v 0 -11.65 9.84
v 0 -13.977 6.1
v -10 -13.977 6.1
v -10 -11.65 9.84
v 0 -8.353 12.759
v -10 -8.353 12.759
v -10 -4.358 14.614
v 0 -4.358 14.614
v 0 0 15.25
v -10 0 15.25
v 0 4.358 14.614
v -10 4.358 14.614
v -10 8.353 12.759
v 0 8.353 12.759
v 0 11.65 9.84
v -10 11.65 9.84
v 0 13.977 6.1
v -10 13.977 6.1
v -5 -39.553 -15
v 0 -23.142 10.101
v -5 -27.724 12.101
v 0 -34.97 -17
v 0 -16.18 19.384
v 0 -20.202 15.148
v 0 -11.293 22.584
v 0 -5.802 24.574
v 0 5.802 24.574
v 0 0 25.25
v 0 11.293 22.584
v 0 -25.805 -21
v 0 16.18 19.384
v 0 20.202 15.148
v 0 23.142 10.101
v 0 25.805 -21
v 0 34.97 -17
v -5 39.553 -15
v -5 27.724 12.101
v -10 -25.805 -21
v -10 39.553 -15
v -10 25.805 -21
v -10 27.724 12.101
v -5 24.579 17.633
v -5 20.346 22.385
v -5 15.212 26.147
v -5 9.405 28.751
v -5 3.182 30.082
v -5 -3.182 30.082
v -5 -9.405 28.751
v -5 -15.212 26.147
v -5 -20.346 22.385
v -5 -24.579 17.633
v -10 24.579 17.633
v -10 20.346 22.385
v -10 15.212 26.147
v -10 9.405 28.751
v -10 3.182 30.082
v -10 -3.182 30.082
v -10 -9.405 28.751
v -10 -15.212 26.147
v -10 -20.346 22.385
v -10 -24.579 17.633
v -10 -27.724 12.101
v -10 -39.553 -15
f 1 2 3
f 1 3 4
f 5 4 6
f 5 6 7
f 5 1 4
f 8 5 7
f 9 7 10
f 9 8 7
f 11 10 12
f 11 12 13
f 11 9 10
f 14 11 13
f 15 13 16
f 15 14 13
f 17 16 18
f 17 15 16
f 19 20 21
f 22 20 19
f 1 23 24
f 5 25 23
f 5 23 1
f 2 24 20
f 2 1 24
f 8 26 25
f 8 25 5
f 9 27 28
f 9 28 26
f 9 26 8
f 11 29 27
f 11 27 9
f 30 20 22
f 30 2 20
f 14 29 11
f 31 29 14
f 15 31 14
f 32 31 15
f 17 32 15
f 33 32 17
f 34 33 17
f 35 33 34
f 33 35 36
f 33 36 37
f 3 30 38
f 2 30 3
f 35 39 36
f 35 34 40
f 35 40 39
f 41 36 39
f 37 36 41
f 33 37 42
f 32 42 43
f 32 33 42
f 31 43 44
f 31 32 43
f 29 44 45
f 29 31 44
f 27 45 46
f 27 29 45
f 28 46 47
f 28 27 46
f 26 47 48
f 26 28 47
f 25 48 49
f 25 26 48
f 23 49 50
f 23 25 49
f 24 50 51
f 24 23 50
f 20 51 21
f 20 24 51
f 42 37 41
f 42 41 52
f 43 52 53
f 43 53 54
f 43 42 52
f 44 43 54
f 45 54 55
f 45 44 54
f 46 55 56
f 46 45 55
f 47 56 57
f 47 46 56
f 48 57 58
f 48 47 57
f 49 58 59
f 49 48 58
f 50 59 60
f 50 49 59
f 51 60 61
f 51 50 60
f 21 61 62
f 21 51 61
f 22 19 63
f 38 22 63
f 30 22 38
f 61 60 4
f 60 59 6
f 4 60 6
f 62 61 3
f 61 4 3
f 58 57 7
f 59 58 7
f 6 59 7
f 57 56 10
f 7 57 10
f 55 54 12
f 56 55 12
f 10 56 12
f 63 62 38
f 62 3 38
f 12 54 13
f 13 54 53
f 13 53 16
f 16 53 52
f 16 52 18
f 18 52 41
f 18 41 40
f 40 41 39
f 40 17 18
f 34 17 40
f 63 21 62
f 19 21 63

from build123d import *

# Parameters (mm, degrees)
EXTRUDE_1_DEPTH = 10
CHAMFER_1_SIZE  = 5


with BuildPart() as part:
    # 草图1 → 凸台-拉伸1 (new body)
    with BuildSketch(Plane.ZY):
        with BuildLine():
            Line((6.100444343, 13.976661934), (-21, 25.805291199))
            Line((-21, 25.805291199), (-14.999562941, 39.552827528))
            Line((-14.999562941, 39.552827528), (12.100881401, 27.724198263))
            ThreePointArc((12.100881401, 27.724198263), (30.25, 0), (12.100881401, -27.724198263))
            Line((12.100881401, -27.724198263), (-14.999562941, -39.552827528))
            Line((-14.999562941, -39.552827528), (-21, -25.805291199))
            Line((-21, -25.805291199), (6.100444343, -13.976661934))
            ThreePointArc((6.100444343, -13.976661934), (15.25, 0), (6.100444343, 13.976661934))
        make_face()
    extrude(amount=EXTRUDE_1_DEPTH)

    # 倒角1
    chamfer_1_edges = [part.edges().sort_by_distance(p)[0] for p in [
        (0, -33.638512895, -1.44934077),
        (0, 33.638512895, -1.44934077),
        (0, 0, 30.25),
    ]]
    chamfer(chamfer_1_edges, length=CHAMFER_1_SIZE)


solid = part.part
